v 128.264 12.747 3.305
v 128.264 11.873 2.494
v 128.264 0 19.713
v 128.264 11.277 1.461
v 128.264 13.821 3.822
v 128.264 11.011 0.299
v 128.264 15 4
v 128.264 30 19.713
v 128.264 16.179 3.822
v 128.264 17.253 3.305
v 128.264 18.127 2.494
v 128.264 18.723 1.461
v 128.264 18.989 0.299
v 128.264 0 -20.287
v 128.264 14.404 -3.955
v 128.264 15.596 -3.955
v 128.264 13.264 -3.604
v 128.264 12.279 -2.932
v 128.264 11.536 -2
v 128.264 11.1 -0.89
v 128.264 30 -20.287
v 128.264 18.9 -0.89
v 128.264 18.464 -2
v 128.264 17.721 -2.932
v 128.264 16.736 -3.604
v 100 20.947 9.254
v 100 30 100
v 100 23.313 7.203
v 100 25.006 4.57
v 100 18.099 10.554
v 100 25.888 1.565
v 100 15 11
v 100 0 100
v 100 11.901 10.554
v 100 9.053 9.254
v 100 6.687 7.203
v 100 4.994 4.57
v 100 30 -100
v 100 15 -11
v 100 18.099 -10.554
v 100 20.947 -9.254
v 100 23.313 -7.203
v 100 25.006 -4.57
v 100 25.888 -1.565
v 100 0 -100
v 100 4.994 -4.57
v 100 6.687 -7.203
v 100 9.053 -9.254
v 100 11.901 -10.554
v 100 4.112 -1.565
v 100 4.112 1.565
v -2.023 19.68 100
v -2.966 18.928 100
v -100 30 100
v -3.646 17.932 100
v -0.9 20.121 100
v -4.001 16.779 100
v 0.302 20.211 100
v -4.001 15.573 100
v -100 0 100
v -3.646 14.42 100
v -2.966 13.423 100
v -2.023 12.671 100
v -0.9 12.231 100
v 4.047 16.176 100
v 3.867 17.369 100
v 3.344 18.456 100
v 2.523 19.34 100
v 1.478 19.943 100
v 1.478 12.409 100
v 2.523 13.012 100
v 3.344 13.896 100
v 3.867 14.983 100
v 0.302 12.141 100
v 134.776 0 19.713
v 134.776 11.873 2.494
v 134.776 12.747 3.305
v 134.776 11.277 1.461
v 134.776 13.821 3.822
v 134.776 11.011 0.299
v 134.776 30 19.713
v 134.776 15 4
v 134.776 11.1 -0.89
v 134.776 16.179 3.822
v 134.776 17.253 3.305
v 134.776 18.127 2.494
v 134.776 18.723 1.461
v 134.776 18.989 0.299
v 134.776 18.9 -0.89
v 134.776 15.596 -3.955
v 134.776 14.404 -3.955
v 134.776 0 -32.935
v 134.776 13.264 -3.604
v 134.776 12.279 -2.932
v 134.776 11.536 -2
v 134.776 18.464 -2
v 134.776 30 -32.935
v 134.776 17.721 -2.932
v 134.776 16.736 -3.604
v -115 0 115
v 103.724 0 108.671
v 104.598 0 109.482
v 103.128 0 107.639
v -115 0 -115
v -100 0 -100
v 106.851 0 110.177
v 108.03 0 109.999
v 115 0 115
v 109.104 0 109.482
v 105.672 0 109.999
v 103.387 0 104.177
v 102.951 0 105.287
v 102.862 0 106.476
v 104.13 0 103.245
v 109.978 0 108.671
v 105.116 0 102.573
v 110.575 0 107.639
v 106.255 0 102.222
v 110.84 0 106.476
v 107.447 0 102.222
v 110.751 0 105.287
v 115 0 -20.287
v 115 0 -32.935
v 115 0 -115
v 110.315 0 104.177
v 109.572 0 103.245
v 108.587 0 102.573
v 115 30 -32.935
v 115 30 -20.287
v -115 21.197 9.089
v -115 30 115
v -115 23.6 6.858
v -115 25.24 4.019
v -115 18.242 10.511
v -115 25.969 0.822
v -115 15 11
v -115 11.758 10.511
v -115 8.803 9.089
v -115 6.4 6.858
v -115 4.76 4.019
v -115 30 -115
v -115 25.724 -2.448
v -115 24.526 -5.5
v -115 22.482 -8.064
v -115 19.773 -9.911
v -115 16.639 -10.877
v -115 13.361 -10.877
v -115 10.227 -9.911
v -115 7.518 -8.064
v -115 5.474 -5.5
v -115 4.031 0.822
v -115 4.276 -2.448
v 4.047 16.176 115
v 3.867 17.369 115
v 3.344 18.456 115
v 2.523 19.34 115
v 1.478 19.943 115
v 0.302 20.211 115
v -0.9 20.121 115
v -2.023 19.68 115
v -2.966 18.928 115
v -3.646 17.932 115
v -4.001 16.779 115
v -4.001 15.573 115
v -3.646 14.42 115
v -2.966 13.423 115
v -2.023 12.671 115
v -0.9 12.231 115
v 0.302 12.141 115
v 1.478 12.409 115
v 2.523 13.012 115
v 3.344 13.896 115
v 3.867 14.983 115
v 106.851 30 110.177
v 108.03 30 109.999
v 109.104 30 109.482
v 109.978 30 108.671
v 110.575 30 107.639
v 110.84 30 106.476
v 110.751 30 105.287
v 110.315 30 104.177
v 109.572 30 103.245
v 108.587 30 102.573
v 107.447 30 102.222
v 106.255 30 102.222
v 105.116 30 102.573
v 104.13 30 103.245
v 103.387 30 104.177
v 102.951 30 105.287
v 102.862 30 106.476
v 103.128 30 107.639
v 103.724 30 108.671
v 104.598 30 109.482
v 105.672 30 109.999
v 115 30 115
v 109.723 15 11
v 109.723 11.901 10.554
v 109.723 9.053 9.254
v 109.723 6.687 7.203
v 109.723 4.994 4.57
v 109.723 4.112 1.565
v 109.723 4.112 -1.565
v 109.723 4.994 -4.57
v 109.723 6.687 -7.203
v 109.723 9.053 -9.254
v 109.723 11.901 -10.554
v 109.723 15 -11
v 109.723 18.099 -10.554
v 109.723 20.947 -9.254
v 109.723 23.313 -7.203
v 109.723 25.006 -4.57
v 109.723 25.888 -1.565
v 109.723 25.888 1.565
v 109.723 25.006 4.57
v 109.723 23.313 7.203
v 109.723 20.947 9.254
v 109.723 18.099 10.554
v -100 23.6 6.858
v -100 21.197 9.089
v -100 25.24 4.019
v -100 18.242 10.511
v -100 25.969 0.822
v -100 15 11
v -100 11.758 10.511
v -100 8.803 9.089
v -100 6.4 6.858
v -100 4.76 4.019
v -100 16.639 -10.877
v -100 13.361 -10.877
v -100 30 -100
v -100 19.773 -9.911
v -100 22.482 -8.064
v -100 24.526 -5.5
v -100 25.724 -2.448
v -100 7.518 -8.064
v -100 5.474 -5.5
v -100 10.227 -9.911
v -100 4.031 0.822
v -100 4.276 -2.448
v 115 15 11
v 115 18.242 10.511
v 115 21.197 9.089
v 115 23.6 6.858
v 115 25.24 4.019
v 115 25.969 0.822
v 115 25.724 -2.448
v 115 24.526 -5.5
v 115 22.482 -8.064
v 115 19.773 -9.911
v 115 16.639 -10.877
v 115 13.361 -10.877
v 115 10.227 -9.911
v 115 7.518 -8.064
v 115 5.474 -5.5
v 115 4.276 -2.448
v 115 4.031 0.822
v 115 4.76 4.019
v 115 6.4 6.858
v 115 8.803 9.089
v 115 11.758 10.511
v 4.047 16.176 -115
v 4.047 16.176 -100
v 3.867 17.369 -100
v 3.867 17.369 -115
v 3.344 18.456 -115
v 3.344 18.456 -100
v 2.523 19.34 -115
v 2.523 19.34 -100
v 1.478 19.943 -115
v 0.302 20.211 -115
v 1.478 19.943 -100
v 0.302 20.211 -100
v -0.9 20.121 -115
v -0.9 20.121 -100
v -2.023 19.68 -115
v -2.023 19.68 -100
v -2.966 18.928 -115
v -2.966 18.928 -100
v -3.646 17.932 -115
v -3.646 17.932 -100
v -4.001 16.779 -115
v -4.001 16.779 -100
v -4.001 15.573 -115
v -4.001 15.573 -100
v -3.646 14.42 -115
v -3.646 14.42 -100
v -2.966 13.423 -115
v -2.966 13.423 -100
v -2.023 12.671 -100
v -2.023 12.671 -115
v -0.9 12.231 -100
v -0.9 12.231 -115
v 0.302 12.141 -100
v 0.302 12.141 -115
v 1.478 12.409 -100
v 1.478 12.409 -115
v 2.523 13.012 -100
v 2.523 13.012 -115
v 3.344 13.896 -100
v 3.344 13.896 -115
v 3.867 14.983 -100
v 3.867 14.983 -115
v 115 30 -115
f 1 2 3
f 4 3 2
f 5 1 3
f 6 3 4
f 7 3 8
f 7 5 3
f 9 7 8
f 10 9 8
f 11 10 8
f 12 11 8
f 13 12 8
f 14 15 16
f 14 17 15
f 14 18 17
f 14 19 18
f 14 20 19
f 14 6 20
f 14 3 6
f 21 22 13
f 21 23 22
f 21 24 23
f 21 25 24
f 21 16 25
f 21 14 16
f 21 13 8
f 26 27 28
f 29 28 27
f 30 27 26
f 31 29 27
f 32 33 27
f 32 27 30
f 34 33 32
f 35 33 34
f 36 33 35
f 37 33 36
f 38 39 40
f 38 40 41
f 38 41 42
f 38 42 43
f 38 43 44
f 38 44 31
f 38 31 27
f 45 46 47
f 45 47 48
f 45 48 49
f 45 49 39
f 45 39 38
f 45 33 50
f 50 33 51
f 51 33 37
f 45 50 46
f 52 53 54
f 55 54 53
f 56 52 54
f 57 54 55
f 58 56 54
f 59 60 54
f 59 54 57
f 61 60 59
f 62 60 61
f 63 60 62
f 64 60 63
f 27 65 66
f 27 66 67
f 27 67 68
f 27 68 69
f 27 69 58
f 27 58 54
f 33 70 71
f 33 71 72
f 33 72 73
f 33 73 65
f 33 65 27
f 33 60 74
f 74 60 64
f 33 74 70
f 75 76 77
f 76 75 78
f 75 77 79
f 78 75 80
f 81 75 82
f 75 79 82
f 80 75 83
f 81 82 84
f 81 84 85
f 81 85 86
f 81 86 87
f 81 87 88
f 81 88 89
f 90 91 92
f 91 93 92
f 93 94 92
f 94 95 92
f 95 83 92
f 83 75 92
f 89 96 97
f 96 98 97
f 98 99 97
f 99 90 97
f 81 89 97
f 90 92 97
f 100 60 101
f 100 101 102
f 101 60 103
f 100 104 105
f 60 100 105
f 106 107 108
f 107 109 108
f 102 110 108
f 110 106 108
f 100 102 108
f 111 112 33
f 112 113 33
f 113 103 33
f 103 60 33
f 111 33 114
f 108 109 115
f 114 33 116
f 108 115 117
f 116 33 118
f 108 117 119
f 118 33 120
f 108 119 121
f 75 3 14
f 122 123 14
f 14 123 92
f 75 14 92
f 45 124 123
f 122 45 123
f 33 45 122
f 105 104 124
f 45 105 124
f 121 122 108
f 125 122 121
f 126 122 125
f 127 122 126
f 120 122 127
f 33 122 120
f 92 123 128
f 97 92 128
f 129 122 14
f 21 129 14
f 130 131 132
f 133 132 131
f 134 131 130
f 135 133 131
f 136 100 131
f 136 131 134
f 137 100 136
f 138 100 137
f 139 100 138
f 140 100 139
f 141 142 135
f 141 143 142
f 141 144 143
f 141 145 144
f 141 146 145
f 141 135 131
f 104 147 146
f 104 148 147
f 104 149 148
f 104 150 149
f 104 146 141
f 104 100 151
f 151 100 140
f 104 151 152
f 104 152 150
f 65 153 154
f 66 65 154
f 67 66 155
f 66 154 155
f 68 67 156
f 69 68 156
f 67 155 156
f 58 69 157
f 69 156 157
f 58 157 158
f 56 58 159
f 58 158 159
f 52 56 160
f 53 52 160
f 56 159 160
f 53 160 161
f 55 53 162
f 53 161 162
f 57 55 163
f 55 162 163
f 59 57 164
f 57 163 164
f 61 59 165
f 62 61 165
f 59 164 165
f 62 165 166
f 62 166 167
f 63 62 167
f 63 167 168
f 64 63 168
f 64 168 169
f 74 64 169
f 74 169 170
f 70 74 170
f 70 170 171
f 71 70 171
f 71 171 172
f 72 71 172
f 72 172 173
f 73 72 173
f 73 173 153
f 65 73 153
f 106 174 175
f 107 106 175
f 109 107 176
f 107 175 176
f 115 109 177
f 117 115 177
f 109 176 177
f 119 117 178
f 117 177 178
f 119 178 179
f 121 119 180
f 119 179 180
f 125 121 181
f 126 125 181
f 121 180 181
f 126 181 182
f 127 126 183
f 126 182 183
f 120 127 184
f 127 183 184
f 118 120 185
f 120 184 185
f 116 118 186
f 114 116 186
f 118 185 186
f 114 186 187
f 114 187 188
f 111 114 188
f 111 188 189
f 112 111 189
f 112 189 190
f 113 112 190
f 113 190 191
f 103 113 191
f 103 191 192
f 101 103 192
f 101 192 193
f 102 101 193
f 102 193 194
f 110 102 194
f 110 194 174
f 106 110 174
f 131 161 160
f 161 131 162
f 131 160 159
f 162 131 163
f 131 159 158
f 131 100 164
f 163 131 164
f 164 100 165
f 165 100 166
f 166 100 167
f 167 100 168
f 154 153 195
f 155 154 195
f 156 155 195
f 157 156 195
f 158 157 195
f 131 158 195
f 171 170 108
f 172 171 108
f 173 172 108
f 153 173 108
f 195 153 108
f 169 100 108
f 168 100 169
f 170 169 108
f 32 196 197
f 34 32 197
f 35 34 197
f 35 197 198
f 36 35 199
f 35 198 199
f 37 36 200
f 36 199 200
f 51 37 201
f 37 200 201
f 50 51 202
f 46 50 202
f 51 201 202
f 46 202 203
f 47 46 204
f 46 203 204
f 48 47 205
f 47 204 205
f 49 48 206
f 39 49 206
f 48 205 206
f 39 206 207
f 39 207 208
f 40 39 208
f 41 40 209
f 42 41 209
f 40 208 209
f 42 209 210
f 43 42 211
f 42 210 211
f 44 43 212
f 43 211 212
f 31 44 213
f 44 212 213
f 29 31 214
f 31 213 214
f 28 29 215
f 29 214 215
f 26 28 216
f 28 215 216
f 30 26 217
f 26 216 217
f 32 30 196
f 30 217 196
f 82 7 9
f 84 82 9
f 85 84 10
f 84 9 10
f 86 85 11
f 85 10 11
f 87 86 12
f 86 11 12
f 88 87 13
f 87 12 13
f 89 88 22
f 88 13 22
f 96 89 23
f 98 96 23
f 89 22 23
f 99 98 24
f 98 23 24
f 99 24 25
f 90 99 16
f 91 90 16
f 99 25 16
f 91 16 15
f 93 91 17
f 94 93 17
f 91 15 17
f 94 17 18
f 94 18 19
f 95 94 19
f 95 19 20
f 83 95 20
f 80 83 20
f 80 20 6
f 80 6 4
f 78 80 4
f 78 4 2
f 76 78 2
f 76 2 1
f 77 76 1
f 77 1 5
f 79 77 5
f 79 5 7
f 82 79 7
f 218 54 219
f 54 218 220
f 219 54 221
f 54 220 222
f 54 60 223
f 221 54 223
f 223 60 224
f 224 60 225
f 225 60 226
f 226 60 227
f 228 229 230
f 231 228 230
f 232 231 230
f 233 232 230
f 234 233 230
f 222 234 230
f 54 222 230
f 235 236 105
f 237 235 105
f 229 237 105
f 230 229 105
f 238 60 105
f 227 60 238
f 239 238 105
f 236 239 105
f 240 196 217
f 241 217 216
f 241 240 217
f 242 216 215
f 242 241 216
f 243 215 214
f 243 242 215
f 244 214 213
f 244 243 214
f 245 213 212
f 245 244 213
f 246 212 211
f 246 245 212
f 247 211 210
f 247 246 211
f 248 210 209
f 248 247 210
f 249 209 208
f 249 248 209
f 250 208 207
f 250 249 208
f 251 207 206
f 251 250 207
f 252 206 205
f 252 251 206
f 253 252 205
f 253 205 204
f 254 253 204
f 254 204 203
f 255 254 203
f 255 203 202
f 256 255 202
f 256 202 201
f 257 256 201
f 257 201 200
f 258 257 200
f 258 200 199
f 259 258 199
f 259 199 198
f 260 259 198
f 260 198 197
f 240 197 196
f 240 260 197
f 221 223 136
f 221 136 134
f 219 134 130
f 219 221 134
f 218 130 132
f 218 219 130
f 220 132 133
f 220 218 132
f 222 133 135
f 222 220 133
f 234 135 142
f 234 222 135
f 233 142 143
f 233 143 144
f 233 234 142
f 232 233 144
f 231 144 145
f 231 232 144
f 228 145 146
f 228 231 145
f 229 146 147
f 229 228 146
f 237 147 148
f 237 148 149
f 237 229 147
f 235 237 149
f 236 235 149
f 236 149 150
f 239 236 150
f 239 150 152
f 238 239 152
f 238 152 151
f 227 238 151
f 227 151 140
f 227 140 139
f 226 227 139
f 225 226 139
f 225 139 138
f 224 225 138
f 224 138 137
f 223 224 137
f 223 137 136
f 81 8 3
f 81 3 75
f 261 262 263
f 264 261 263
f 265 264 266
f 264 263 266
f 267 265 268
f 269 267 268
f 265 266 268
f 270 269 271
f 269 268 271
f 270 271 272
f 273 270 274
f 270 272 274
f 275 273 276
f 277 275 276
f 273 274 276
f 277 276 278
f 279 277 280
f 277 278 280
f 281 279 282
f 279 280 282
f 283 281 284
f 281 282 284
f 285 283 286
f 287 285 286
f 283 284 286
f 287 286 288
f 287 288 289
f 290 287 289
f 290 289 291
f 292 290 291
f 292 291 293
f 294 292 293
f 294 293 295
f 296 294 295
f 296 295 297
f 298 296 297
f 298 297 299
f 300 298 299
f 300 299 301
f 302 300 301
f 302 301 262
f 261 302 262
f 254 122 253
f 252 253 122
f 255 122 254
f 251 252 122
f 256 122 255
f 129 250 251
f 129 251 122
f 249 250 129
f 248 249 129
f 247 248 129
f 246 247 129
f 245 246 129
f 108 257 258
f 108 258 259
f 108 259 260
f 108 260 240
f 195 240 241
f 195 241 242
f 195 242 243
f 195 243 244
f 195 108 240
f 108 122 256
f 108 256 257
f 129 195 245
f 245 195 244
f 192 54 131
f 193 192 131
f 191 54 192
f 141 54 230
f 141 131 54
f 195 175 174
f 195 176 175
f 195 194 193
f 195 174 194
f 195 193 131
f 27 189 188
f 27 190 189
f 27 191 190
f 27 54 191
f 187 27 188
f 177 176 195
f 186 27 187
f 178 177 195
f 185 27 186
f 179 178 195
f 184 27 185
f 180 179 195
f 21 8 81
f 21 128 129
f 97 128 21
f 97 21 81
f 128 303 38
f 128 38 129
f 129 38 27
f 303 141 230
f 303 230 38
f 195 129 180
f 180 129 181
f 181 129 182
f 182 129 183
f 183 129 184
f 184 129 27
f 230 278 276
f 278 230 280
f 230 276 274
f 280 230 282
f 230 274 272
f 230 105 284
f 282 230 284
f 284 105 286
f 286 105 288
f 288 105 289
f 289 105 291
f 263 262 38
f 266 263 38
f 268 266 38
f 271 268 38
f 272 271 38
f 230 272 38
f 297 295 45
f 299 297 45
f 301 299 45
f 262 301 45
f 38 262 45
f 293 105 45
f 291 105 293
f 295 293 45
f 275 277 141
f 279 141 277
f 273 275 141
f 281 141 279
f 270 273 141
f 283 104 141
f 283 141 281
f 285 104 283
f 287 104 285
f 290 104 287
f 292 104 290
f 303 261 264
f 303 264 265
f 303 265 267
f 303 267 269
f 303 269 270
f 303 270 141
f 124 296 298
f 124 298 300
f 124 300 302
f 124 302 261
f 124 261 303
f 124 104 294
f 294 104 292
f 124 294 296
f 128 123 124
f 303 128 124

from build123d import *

# Parameters (mm, degrees)
SKETCH1_W           = 230
SKETCH1_H           = 230
SKETCH1_W_2         = 200
SKETCH1_H_2         = 200
BOSS_EXTRUDE1_DEPTH = 30
SKETCH2_R           = 11
CUT_EXTRUDE3_DEPTH  = 206
SKETCH3_W           = 12.648408852
SKETCH3_H           = 30
BOSS_EXTRUDE2_DEPTH = 28
SKETCH4_W           = 33.277006623
SKETCH4_H           = 30
BOSS_EXTRUDE4_DEPTH = 41
SKETCH6_R           = 4
CUT_EXTRUDE4_DEPTH  = 218
SKETCH8_R           = 4.046690546
CUT_EXTRUDE6_DEPTH  = 280
CUT_EXTRUDE7_START  = -230
SKETCH9_R           = 11
CUT_EXTRUDE7_DEPTH  = 230
SKETCH11_W          = 19.776160892
SKETCH11_H          = 30
CUT_EXTRUDE8_DEPTH  = 41
SKETCH12_R          = 4
CUT_EXTRUDE9_DEPTH  = 264
SKETCH13_R          = 4
CUT_EXTRUDE10_DEPTH = 264
SKETCH15_W          = 8.223839108
SKETCH15_H          = 30
CUT_EXTRUDE11_DEPTH = 64
SKETCH16_W          = 6.512440182
SKETCH16_H          = 30
BOSS_EXTRUDE5_DEPTH = 40
SKETCH17_R          = 4
CUT_EXTRUDE12_DEPTH = 276


with BuildPart() as part:
    # Sketch1 → Boss-Extrude1 (new body)
    with BuildSketch(Plane(origin=(0, 0, 0), x_dir=(1, 0, 0), z_dir=(0, 1, 0))):
        Rectangle(SKETCH1_W, SKETCH1_H)
        Rectangle(SKETCH1_W_2, SKETCH1_H_2, mode=Mode.SUBTRACT)
    extrude(amount=BOSS_EXTRUDE1_DEPTH)

    # Sketch2 → Cut-Extrude3 (cut)
    with BuildSketch(Plane(origin=(115, 0, 0), x_dir=(0, 0, -1), z_dir=(1, 0, 0))):
        with Locations((0, 15)):
            Circle(SKETCH2_R)
    extrude(amount=-CUT_EXTRUDE3_DEPTH, mode=Mode.SUBTRACT)

    # Sketch3 → Boss-Extrude2 (add)
    with BuildSketch(Plane(origin=(115, 0, 0), x_dir=(0, 0, -1), z_dir=(1, 0, 0))):
        with Locations((26.610788675, 15)):
            Rectangle(SKETCH3_W, SKETCH3_H)
    extrude(amount=BOSS_EXTRUDE2_DEPTH)

    # Sketch4 → Boss-Extrude4 (add)
    with BuildSketch(Plane.XY.offset(-20.286584249)):
        with Locations((126.361496689, 15)):
            Rectangle(SKETCH4_W, SKETCH4_H)
    extrude(amount=BOSS_EXTRUDE4_DEPTH)

    # Sketch6 → Cut-Extrude4 (cut)
    with BuildSketch(Plane.ZY.offset(115)):
        with Locations((0, 15)):
            Circle(SKETCH6_R)
    extrude(amount=-CUT_EXTRUDE4_DEPTH, mode=Mode.SUBTRACT)

    # Sketch8 → Cut-Extrude6 (cut)
    with BuildSketch(Plane.XY.offset(115)):
        with Locations((0, 16.175919114)):
            Circle(SKETCH8_R)
    extrude(amount=-CUT_EXTRUDE6_DEPTH, mode=Mode.SUBTRACT)

    # Sketch9 → Cut-Extrude7 (cut)
    with BuildSketch(Plane.ZY.offset(115).offset(CUT_EXTRUDE7_START)):
        with Locations((0, 15)):
            Circle(SKETCH9_R)
    extrude(amount=CUT_EXTRUDE7_DEPTH, mode=Mode.SUBTRACT)

    # Sketch11 → Cut-Extrude8 (cut)
    with BuildSketch(Plane.XY.offset(20.713415751)):
        with Locations((124.888080446, 15)):
            Rectangle(SKETCH11_W, SKETCH11_H)
    extrude(amount=-CUT_EXTRUDE8_DEPTH, mode=Mode.SUBTRACT)

    # Sketch12 → Cut-Extrude9 (cut)
    with BuildSketch(Plane.ZY.offset(115)):
        with Locations((0, 15)):
            Circle(SKETCH12_R)
    extrude(amount=-CUT_EXTRUDE9_DEPTH, mode=Mode.SUBTRACT)

    # Sketch13 → Cut-Extrude10 (cut)
    with BuildSketch(Plane(origin=(0, 30, 0), x_dir=(1, 0, 0), z_dir=(0, 1, 0))):
        with Locations(Location((106.851068212, -106.17718303, 0), (0, 0, 270))):
            Circle(SKETCH13_R)
    extrude(amount=-CUT_EXTRUDE10_DEPTH, mode=Mode.SUBTRACT)

    # Sketch15 → Cut-Extrude11 (cut)
    with BuildSketch(Plane.XY.offset(20.713415751)):
        with Locations((138.888080446, 15)):
            Rectangle(SKETCH15_W, SKETCH15_H)
    extrude(amount=-CUT_EXTRUDE11_DEPTH, mode=Mode.SUBTRACT)

    # Sketch16 → Boss-Extrude5 (add)
    with BuildSketch(Plane.XY.offset(-20.286584249)):
        with Locations((131.519940801, 15)):
            Rectangle(SKETCH16_W, SKETCH16_H)
    extrude(amount=BOSS_EXTRUDE5_DEPTH)

    # Sketch17 → Cut-Extrude12 (cut)
    with BuildSketch(Plane.ZY.offset(115)):
        with Locations((0, 15)):
            Circle(SKETCH17_R)
    extrude(amount=-CUT_EXTRUDE12_DEPTH, mode=Mode.SUBTRACT)


solid = part.part
